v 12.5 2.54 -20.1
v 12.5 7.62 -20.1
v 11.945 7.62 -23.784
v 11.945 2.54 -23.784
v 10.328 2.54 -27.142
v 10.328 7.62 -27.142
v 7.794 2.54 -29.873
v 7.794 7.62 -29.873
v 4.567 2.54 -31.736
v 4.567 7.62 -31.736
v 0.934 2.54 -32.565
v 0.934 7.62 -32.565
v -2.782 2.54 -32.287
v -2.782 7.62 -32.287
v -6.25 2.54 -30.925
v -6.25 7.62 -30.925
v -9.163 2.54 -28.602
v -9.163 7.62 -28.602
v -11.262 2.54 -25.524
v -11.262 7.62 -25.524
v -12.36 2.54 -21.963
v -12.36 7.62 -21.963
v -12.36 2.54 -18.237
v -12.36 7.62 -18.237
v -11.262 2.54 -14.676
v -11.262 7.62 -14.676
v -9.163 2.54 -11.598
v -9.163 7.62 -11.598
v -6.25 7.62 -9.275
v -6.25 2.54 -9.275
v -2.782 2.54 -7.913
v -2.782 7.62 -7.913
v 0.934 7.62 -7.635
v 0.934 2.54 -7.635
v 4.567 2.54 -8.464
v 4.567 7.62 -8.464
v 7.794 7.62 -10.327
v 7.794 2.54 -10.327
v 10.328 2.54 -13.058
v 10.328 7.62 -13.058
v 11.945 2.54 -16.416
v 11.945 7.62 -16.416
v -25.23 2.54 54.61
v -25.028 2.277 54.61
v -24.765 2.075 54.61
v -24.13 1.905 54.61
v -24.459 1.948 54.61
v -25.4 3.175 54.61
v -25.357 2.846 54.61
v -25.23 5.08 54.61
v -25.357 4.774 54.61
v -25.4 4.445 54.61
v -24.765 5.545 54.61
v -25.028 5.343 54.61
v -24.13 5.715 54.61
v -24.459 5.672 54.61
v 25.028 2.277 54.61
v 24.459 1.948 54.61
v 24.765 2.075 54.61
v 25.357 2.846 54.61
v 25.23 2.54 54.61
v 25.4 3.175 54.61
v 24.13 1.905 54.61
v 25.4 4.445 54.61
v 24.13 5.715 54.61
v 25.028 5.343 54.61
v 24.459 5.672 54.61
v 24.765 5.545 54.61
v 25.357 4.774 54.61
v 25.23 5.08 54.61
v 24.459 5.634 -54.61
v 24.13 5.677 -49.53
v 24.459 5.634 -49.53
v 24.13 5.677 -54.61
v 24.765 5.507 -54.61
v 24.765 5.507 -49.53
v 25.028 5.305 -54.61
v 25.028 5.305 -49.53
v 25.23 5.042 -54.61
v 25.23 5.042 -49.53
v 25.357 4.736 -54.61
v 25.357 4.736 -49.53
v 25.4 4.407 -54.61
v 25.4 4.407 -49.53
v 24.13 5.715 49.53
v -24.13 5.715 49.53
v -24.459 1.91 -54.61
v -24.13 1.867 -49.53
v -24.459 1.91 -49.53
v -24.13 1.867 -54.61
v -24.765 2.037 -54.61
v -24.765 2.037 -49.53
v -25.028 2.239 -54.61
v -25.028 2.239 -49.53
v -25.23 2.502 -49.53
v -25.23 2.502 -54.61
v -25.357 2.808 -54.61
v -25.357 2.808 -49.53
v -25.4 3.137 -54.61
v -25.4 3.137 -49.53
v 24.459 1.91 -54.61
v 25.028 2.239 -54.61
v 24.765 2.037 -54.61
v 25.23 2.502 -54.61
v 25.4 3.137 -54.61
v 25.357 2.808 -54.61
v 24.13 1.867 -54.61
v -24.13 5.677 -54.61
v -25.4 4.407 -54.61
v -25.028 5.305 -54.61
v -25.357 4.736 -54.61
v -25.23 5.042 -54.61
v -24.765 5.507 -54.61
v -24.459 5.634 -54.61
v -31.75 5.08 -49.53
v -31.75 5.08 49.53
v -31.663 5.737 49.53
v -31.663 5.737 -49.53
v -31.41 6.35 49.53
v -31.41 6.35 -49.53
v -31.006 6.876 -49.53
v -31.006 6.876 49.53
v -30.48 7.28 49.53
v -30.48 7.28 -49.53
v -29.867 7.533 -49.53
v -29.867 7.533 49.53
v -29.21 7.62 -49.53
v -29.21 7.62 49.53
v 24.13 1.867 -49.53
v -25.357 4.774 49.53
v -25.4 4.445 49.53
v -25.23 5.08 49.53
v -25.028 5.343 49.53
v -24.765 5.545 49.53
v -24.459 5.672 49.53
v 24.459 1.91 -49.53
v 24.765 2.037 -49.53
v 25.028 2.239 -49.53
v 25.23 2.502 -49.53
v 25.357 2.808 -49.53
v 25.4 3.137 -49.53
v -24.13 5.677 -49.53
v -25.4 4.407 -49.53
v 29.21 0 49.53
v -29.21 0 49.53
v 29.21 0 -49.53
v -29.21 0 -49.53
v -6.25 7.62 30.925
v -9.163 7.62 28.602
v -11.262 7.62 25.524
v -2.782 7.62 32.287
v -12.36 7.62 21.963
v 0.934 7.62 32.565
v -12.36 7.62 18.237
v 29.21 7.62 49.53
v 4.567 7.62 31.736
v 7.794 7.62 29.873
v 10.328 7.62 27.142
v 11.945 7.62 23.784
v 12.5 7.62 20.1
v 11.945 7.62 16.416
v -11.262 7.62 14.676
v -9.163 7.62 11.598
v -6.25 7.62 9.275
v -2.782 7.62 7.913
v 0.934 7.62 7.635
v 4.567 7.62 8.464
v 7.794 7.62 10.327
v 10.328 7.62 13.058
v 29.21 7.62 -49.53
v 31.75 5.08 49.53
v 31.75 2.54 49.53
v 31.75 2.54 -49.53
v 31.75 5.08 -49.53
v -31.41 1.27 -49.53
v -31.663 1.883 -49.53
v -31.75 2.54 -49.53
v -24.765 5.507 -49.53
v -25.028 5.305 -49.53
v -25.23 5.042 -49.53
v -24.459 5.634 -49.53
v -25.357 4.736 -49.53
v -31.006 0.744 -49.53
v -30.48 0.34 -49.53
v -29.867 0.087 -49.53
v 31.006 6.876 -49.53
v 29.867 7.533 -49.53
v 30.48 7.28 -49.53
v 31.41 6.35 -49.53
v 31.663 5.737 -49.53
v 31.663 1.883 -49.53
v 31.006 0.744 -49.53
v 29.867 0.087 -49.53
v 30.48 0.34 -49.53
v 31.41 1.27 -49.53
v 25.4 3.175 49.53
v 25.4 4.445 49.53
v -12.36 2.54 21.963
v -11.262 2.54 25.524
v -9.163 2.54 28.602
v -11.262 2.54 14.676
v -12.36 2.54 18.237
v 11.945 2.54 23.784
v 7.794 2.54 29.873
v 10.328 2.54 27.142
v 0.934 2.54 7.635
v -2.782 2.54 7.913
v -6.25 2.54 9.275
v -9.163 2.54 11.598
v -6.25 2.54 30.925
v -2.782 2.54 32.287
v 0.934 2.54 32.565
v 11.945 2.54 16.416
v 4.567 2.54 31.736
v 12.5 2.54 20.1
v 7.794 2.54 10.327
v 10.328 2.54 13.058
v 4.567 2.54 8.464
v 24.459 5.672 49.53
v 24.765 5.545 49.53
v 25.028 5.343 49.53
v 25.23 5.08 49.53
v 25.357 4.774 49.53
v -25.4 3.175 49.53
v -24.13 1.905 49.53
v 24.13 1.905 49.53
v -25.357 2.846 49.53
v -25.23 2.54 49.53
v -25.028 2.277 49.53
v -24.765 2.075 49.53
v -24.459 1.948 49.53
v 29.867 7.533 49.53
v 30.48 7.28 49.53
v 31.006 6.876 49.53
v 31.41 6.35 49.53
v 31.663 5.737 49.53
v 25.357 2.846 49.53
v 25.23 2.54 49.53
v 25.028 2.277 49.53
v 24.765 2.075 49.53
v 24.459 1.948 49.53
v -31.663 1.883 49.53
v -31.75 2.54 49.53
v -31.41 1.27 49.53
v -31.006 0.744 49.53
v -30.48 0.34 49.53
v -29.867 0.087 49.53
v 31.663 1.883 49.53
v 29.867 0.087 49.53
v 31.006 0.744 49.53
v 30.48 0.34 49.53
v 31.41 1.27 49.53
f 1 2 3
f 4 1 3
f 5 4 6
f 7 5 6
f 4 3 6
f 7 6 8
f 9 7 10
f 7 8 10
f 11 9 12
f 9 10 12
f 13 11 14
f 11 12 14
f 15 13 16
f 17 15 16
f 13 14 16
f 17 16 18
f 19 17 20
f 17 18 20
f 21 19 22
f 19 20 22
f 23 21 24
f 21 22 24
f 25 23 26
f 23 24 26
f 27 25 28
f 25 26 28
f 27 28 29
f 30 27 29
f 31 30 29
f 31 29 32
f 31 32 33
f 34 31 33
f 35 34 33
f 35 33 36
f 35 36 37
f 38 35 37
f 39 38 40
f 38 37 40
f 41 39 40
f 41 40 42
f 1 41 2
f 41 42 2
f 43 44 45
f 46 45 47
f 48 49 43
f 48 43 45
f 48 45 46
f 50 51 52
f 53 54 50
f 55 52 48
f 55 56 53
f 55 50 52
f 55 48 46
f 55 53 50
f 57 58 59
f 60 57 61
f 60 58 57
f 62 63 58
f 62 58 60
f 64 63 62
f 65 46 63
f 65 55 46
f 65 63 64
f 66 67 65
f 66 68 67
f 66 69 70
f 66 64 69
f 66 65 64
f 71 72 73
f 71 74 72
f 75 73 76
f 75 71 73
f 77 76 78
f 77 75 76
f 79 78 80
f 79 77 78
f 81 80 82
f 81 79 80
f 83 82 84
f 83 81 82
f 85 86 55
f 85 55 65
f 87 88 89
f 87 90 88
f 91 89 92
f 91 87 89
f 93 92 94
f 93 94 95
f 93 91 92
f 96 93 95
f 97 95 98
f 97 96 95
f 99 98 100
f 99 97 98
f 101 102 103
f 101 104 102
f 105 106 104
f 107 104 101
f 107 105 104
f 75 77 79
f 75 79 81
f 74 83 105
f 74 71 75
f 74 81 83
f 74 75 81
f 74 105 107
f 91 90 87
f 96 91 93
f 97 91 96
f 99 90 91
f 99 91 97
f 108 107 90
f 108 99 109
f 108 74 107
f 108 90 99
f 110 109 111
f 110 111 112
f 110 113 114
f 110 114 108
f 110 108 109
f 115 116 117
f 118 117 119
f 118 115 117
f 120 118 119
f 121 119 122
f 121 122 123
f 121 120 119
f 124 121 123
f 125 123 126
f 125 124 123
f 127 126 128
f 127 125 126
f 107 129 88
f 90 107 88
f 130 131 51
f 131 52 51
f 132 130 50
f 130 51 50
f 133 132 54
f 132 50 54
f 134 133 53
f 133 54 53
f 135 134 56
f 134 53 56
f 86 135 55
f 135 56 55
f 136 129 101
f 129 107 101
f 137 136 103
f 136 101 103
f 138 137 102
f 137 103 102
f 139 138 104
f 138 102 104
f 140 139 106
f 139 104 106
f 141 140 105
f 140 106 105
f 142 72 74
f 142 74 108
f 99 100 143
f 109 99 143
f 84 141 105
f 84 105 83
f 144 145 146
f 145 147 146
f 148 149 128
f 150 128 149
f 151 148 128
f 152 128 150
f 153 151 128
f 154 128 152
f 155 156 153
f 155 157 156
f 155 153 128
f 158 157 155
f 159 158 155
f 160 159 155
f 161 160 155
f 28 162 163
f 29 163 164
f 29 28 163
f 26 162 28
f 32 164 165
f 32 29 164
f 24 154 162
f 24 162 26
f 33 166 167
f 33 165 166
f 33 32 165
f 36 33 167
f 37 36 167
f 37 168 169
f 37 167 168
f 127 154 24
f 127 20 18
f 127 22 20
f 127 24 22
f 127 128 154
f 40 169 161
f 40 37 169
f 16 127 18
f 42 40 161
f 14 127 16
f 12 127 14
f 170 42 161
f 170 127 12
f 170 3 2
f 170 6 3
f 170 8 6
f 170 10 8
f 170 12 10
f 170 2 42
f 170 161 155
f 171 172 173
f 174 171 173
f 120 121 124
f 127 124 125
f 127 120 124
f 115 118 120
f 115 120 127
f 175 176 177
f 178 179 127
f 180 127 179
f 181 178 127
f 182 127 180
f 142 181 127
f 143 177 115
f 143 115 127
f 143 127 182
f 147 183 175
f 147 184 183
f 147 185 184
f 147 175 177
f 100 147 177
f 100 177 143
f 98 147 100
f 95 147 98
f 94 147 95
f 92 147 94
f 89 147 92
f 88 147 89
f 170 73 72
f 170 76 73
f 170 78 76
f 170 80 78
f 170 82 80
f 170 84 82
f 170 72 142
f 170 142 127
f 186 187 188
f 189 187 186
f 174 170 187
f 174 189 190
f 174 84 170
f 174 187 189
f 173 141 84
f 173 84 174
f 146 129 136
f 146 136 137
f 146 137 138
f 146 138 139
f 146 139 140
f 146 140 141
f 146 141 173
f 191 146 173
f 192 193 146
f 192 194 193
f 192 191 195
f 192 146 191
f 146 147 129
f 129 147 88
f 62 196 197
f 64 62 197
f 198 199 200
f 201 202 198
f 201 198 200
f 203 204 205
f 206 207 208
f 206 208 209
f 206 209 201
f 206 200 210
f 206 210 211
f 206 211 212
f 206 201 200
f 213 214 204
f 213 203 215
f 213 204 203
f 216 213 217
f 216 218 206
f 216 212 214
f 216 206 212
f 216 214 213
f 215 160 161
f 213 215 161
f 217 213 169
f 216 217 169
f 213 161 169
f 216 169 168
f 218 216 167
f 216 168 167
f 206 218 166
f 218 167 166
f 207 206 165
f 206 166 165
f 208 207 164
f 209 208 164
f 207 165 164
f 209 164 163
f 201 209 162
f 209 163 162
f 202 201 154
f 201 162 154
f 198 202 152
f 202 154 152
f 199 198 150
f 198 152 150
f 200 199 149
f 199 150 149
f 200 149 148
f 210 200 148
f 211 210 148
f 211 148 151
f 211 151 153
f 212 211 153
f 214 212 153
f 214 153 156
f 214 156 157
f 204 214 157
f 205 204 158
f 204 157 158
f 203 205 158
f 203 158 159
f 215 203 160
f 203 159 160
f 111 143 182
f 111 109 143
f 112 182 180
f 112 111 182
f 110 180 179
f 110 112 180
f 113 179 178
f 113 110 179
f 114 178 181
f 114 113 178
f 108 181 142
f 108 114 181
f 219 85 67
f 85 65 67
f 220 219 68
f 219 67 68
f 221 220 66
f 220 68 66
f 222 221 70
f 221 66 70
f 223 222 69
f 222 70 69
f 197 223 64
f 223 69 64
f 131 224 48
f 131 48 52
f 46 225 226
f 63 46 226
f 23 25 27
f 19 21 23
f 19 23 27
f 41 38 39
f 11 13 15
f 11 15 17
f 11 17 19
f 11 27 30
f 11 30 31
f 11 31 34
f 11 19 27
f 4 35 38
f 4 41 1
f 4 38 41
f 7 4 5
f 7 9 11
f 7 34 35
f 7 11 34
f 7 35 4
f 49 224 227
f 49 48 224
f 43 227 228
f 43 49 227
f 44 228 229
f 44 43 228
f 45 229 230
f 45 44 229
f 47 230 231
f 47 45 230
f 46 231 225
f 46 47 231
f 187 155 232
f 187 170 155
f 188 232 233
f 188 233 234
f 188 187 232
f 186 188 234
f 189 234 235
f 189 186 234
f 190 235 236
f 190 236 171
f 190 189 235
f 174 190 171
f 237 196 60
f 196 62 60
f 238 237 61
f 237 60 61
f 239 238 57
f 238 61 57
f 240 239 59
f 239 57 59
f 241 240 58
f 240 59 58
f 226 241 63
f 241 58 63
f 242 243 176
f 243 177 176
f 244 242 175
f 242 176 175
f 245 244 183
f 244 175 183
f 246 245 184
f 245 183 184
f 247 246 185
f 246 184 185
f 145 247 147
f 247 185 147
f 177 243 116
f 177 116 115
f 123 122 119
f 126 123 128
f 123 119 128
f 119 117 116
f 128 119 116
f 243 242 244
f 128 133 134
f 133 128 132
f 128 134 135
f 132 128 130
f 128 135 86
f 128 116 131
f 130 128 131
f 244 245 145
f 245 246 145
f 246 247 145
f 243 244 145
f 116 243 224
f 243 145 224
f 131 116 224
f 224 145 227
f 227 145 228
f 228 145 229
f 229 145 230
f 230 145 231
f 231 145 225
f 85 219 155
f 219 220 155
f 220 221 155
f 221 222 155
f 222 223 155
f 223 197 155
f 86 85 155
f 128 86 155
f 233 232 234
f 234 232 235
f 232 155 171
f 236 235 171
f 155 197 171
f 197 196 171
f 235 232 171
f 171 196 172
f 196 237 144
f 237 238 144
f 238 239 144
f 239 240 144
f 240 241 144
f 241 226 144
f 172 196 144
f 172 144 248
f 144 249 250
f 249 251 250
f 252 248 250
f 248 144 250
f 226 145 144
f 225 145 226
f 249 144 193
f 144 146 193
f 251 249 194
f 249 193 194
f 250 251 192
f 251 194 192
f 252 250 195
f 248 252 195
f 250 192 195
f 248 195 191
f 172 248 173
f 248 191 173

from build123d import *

# Parameters (mm, degrees)
SKETCH1_W           = 63.5
SKETCH1_H           = 99.06
BOSS_EXTRUDE1_DEPTH = 7.62
SKETCH2_R           = 12.5
CUT_EXTRUDE1_DEPTH  = 5.08
FILLET1_R           = 2.54
SKETCH3_W           = 50.8
SKETCH3_H           = 3.81
BOSS_EXTRUDE2_DEPTH = 5.08
FILLET2_R           = 1.27
SKETCH4_W           = 50.8
SKETCH4_H           = 3.81
BOSS_EXTRUDE3_DEPTH = 5.08
FILLET3_R           = 1.27


with BuildPart() as part:
    # Sketch1 → Boss-Extrude1 (new body)
    with BuildSketch(Plane(origin=(0, 0, 0), x_dir=(1, 0, 0), z_dir=(0, 1, 0))):
        Rectangle(SKETCH1_W, SKETCH1_H)
    extrude(amount=BOSS_EXTRUDE1_DEPTH)

    # Sketch2 → Cut-Extrude1 (cut)
    with BuildSketch(Plane(origin=(0, 7.62, 0), x_dir=(1, 0, 0), z_dir=(0, 1, 0))):
        with Locations((0, -20.1)):
            Circle(SKETCH2_R)
        with Locations((0, 20.1)):
            Circle(SKETCH2_R)
    extrude(amount=-CUT_EXTRUDE1_DEPTH, mode=Mode.SUBTRACT)

    # Fillet1
    fillet1_edges = [part.edges().sort_by_distance(p)[0] for p in [
        (-31.75, 7.62, 0),
        (31.75, 7.62, 0),
        (-31.75, 0, 0),
        (31.75, 0, 0),
    ]]
    fillet(fillet1_edges, radius=FILLET1_R)

    # Sketch3 → Boss-Extrude2 (add)
    with BuildSketch(Plane.XY.offset(49.53)):
        with Locations((0, 3.81)):
            Rectangle(SKETCH3_W, SKETCH3_H)
    extrude(amount=BOSS_EXTRUDE2_DEPTH)

    # Fillet2
    fillet2_edges = [part.edges().sort_by_distance(p)[0] for p in [
        (-25.4, 5.715, 52.07),
        (-25.4, 1.905, 52.07),
        (25.4, 1.905, 52.07),
        (25.4, 5.715, 52.07),
    ]]
    fillet(fillet2_edges, radius=FILLET2_R)

    # Sketch4 → Boss-Extrude3 (add)
    with BuildSketch(Plane(origin=(0, 0, -49.53), x_dir=(-1, 0, 0), z_dir=(0, 0, -1))):
        with Locations((0, 3.772103496)):
            Rectangle(SKETCH4_W, SKETCH4_H)
    extrude(amount=BOSS_EXTRUDE3_DEPTH)

    # Fillet3
    fillet3_edges = [part.edges().sort_by_distance(p)[0] for p in [
        (-25.4, 1.867103496, -52.07),
        (-25.4, 5.677103496, -52.07),
        (25.4, 5.677103496, -52.07),
        (25.4, 1.867103496, -52.07),
    ]]
    fillet(fillet3_edges, radius=FILLET3_R)


solid = part.part
